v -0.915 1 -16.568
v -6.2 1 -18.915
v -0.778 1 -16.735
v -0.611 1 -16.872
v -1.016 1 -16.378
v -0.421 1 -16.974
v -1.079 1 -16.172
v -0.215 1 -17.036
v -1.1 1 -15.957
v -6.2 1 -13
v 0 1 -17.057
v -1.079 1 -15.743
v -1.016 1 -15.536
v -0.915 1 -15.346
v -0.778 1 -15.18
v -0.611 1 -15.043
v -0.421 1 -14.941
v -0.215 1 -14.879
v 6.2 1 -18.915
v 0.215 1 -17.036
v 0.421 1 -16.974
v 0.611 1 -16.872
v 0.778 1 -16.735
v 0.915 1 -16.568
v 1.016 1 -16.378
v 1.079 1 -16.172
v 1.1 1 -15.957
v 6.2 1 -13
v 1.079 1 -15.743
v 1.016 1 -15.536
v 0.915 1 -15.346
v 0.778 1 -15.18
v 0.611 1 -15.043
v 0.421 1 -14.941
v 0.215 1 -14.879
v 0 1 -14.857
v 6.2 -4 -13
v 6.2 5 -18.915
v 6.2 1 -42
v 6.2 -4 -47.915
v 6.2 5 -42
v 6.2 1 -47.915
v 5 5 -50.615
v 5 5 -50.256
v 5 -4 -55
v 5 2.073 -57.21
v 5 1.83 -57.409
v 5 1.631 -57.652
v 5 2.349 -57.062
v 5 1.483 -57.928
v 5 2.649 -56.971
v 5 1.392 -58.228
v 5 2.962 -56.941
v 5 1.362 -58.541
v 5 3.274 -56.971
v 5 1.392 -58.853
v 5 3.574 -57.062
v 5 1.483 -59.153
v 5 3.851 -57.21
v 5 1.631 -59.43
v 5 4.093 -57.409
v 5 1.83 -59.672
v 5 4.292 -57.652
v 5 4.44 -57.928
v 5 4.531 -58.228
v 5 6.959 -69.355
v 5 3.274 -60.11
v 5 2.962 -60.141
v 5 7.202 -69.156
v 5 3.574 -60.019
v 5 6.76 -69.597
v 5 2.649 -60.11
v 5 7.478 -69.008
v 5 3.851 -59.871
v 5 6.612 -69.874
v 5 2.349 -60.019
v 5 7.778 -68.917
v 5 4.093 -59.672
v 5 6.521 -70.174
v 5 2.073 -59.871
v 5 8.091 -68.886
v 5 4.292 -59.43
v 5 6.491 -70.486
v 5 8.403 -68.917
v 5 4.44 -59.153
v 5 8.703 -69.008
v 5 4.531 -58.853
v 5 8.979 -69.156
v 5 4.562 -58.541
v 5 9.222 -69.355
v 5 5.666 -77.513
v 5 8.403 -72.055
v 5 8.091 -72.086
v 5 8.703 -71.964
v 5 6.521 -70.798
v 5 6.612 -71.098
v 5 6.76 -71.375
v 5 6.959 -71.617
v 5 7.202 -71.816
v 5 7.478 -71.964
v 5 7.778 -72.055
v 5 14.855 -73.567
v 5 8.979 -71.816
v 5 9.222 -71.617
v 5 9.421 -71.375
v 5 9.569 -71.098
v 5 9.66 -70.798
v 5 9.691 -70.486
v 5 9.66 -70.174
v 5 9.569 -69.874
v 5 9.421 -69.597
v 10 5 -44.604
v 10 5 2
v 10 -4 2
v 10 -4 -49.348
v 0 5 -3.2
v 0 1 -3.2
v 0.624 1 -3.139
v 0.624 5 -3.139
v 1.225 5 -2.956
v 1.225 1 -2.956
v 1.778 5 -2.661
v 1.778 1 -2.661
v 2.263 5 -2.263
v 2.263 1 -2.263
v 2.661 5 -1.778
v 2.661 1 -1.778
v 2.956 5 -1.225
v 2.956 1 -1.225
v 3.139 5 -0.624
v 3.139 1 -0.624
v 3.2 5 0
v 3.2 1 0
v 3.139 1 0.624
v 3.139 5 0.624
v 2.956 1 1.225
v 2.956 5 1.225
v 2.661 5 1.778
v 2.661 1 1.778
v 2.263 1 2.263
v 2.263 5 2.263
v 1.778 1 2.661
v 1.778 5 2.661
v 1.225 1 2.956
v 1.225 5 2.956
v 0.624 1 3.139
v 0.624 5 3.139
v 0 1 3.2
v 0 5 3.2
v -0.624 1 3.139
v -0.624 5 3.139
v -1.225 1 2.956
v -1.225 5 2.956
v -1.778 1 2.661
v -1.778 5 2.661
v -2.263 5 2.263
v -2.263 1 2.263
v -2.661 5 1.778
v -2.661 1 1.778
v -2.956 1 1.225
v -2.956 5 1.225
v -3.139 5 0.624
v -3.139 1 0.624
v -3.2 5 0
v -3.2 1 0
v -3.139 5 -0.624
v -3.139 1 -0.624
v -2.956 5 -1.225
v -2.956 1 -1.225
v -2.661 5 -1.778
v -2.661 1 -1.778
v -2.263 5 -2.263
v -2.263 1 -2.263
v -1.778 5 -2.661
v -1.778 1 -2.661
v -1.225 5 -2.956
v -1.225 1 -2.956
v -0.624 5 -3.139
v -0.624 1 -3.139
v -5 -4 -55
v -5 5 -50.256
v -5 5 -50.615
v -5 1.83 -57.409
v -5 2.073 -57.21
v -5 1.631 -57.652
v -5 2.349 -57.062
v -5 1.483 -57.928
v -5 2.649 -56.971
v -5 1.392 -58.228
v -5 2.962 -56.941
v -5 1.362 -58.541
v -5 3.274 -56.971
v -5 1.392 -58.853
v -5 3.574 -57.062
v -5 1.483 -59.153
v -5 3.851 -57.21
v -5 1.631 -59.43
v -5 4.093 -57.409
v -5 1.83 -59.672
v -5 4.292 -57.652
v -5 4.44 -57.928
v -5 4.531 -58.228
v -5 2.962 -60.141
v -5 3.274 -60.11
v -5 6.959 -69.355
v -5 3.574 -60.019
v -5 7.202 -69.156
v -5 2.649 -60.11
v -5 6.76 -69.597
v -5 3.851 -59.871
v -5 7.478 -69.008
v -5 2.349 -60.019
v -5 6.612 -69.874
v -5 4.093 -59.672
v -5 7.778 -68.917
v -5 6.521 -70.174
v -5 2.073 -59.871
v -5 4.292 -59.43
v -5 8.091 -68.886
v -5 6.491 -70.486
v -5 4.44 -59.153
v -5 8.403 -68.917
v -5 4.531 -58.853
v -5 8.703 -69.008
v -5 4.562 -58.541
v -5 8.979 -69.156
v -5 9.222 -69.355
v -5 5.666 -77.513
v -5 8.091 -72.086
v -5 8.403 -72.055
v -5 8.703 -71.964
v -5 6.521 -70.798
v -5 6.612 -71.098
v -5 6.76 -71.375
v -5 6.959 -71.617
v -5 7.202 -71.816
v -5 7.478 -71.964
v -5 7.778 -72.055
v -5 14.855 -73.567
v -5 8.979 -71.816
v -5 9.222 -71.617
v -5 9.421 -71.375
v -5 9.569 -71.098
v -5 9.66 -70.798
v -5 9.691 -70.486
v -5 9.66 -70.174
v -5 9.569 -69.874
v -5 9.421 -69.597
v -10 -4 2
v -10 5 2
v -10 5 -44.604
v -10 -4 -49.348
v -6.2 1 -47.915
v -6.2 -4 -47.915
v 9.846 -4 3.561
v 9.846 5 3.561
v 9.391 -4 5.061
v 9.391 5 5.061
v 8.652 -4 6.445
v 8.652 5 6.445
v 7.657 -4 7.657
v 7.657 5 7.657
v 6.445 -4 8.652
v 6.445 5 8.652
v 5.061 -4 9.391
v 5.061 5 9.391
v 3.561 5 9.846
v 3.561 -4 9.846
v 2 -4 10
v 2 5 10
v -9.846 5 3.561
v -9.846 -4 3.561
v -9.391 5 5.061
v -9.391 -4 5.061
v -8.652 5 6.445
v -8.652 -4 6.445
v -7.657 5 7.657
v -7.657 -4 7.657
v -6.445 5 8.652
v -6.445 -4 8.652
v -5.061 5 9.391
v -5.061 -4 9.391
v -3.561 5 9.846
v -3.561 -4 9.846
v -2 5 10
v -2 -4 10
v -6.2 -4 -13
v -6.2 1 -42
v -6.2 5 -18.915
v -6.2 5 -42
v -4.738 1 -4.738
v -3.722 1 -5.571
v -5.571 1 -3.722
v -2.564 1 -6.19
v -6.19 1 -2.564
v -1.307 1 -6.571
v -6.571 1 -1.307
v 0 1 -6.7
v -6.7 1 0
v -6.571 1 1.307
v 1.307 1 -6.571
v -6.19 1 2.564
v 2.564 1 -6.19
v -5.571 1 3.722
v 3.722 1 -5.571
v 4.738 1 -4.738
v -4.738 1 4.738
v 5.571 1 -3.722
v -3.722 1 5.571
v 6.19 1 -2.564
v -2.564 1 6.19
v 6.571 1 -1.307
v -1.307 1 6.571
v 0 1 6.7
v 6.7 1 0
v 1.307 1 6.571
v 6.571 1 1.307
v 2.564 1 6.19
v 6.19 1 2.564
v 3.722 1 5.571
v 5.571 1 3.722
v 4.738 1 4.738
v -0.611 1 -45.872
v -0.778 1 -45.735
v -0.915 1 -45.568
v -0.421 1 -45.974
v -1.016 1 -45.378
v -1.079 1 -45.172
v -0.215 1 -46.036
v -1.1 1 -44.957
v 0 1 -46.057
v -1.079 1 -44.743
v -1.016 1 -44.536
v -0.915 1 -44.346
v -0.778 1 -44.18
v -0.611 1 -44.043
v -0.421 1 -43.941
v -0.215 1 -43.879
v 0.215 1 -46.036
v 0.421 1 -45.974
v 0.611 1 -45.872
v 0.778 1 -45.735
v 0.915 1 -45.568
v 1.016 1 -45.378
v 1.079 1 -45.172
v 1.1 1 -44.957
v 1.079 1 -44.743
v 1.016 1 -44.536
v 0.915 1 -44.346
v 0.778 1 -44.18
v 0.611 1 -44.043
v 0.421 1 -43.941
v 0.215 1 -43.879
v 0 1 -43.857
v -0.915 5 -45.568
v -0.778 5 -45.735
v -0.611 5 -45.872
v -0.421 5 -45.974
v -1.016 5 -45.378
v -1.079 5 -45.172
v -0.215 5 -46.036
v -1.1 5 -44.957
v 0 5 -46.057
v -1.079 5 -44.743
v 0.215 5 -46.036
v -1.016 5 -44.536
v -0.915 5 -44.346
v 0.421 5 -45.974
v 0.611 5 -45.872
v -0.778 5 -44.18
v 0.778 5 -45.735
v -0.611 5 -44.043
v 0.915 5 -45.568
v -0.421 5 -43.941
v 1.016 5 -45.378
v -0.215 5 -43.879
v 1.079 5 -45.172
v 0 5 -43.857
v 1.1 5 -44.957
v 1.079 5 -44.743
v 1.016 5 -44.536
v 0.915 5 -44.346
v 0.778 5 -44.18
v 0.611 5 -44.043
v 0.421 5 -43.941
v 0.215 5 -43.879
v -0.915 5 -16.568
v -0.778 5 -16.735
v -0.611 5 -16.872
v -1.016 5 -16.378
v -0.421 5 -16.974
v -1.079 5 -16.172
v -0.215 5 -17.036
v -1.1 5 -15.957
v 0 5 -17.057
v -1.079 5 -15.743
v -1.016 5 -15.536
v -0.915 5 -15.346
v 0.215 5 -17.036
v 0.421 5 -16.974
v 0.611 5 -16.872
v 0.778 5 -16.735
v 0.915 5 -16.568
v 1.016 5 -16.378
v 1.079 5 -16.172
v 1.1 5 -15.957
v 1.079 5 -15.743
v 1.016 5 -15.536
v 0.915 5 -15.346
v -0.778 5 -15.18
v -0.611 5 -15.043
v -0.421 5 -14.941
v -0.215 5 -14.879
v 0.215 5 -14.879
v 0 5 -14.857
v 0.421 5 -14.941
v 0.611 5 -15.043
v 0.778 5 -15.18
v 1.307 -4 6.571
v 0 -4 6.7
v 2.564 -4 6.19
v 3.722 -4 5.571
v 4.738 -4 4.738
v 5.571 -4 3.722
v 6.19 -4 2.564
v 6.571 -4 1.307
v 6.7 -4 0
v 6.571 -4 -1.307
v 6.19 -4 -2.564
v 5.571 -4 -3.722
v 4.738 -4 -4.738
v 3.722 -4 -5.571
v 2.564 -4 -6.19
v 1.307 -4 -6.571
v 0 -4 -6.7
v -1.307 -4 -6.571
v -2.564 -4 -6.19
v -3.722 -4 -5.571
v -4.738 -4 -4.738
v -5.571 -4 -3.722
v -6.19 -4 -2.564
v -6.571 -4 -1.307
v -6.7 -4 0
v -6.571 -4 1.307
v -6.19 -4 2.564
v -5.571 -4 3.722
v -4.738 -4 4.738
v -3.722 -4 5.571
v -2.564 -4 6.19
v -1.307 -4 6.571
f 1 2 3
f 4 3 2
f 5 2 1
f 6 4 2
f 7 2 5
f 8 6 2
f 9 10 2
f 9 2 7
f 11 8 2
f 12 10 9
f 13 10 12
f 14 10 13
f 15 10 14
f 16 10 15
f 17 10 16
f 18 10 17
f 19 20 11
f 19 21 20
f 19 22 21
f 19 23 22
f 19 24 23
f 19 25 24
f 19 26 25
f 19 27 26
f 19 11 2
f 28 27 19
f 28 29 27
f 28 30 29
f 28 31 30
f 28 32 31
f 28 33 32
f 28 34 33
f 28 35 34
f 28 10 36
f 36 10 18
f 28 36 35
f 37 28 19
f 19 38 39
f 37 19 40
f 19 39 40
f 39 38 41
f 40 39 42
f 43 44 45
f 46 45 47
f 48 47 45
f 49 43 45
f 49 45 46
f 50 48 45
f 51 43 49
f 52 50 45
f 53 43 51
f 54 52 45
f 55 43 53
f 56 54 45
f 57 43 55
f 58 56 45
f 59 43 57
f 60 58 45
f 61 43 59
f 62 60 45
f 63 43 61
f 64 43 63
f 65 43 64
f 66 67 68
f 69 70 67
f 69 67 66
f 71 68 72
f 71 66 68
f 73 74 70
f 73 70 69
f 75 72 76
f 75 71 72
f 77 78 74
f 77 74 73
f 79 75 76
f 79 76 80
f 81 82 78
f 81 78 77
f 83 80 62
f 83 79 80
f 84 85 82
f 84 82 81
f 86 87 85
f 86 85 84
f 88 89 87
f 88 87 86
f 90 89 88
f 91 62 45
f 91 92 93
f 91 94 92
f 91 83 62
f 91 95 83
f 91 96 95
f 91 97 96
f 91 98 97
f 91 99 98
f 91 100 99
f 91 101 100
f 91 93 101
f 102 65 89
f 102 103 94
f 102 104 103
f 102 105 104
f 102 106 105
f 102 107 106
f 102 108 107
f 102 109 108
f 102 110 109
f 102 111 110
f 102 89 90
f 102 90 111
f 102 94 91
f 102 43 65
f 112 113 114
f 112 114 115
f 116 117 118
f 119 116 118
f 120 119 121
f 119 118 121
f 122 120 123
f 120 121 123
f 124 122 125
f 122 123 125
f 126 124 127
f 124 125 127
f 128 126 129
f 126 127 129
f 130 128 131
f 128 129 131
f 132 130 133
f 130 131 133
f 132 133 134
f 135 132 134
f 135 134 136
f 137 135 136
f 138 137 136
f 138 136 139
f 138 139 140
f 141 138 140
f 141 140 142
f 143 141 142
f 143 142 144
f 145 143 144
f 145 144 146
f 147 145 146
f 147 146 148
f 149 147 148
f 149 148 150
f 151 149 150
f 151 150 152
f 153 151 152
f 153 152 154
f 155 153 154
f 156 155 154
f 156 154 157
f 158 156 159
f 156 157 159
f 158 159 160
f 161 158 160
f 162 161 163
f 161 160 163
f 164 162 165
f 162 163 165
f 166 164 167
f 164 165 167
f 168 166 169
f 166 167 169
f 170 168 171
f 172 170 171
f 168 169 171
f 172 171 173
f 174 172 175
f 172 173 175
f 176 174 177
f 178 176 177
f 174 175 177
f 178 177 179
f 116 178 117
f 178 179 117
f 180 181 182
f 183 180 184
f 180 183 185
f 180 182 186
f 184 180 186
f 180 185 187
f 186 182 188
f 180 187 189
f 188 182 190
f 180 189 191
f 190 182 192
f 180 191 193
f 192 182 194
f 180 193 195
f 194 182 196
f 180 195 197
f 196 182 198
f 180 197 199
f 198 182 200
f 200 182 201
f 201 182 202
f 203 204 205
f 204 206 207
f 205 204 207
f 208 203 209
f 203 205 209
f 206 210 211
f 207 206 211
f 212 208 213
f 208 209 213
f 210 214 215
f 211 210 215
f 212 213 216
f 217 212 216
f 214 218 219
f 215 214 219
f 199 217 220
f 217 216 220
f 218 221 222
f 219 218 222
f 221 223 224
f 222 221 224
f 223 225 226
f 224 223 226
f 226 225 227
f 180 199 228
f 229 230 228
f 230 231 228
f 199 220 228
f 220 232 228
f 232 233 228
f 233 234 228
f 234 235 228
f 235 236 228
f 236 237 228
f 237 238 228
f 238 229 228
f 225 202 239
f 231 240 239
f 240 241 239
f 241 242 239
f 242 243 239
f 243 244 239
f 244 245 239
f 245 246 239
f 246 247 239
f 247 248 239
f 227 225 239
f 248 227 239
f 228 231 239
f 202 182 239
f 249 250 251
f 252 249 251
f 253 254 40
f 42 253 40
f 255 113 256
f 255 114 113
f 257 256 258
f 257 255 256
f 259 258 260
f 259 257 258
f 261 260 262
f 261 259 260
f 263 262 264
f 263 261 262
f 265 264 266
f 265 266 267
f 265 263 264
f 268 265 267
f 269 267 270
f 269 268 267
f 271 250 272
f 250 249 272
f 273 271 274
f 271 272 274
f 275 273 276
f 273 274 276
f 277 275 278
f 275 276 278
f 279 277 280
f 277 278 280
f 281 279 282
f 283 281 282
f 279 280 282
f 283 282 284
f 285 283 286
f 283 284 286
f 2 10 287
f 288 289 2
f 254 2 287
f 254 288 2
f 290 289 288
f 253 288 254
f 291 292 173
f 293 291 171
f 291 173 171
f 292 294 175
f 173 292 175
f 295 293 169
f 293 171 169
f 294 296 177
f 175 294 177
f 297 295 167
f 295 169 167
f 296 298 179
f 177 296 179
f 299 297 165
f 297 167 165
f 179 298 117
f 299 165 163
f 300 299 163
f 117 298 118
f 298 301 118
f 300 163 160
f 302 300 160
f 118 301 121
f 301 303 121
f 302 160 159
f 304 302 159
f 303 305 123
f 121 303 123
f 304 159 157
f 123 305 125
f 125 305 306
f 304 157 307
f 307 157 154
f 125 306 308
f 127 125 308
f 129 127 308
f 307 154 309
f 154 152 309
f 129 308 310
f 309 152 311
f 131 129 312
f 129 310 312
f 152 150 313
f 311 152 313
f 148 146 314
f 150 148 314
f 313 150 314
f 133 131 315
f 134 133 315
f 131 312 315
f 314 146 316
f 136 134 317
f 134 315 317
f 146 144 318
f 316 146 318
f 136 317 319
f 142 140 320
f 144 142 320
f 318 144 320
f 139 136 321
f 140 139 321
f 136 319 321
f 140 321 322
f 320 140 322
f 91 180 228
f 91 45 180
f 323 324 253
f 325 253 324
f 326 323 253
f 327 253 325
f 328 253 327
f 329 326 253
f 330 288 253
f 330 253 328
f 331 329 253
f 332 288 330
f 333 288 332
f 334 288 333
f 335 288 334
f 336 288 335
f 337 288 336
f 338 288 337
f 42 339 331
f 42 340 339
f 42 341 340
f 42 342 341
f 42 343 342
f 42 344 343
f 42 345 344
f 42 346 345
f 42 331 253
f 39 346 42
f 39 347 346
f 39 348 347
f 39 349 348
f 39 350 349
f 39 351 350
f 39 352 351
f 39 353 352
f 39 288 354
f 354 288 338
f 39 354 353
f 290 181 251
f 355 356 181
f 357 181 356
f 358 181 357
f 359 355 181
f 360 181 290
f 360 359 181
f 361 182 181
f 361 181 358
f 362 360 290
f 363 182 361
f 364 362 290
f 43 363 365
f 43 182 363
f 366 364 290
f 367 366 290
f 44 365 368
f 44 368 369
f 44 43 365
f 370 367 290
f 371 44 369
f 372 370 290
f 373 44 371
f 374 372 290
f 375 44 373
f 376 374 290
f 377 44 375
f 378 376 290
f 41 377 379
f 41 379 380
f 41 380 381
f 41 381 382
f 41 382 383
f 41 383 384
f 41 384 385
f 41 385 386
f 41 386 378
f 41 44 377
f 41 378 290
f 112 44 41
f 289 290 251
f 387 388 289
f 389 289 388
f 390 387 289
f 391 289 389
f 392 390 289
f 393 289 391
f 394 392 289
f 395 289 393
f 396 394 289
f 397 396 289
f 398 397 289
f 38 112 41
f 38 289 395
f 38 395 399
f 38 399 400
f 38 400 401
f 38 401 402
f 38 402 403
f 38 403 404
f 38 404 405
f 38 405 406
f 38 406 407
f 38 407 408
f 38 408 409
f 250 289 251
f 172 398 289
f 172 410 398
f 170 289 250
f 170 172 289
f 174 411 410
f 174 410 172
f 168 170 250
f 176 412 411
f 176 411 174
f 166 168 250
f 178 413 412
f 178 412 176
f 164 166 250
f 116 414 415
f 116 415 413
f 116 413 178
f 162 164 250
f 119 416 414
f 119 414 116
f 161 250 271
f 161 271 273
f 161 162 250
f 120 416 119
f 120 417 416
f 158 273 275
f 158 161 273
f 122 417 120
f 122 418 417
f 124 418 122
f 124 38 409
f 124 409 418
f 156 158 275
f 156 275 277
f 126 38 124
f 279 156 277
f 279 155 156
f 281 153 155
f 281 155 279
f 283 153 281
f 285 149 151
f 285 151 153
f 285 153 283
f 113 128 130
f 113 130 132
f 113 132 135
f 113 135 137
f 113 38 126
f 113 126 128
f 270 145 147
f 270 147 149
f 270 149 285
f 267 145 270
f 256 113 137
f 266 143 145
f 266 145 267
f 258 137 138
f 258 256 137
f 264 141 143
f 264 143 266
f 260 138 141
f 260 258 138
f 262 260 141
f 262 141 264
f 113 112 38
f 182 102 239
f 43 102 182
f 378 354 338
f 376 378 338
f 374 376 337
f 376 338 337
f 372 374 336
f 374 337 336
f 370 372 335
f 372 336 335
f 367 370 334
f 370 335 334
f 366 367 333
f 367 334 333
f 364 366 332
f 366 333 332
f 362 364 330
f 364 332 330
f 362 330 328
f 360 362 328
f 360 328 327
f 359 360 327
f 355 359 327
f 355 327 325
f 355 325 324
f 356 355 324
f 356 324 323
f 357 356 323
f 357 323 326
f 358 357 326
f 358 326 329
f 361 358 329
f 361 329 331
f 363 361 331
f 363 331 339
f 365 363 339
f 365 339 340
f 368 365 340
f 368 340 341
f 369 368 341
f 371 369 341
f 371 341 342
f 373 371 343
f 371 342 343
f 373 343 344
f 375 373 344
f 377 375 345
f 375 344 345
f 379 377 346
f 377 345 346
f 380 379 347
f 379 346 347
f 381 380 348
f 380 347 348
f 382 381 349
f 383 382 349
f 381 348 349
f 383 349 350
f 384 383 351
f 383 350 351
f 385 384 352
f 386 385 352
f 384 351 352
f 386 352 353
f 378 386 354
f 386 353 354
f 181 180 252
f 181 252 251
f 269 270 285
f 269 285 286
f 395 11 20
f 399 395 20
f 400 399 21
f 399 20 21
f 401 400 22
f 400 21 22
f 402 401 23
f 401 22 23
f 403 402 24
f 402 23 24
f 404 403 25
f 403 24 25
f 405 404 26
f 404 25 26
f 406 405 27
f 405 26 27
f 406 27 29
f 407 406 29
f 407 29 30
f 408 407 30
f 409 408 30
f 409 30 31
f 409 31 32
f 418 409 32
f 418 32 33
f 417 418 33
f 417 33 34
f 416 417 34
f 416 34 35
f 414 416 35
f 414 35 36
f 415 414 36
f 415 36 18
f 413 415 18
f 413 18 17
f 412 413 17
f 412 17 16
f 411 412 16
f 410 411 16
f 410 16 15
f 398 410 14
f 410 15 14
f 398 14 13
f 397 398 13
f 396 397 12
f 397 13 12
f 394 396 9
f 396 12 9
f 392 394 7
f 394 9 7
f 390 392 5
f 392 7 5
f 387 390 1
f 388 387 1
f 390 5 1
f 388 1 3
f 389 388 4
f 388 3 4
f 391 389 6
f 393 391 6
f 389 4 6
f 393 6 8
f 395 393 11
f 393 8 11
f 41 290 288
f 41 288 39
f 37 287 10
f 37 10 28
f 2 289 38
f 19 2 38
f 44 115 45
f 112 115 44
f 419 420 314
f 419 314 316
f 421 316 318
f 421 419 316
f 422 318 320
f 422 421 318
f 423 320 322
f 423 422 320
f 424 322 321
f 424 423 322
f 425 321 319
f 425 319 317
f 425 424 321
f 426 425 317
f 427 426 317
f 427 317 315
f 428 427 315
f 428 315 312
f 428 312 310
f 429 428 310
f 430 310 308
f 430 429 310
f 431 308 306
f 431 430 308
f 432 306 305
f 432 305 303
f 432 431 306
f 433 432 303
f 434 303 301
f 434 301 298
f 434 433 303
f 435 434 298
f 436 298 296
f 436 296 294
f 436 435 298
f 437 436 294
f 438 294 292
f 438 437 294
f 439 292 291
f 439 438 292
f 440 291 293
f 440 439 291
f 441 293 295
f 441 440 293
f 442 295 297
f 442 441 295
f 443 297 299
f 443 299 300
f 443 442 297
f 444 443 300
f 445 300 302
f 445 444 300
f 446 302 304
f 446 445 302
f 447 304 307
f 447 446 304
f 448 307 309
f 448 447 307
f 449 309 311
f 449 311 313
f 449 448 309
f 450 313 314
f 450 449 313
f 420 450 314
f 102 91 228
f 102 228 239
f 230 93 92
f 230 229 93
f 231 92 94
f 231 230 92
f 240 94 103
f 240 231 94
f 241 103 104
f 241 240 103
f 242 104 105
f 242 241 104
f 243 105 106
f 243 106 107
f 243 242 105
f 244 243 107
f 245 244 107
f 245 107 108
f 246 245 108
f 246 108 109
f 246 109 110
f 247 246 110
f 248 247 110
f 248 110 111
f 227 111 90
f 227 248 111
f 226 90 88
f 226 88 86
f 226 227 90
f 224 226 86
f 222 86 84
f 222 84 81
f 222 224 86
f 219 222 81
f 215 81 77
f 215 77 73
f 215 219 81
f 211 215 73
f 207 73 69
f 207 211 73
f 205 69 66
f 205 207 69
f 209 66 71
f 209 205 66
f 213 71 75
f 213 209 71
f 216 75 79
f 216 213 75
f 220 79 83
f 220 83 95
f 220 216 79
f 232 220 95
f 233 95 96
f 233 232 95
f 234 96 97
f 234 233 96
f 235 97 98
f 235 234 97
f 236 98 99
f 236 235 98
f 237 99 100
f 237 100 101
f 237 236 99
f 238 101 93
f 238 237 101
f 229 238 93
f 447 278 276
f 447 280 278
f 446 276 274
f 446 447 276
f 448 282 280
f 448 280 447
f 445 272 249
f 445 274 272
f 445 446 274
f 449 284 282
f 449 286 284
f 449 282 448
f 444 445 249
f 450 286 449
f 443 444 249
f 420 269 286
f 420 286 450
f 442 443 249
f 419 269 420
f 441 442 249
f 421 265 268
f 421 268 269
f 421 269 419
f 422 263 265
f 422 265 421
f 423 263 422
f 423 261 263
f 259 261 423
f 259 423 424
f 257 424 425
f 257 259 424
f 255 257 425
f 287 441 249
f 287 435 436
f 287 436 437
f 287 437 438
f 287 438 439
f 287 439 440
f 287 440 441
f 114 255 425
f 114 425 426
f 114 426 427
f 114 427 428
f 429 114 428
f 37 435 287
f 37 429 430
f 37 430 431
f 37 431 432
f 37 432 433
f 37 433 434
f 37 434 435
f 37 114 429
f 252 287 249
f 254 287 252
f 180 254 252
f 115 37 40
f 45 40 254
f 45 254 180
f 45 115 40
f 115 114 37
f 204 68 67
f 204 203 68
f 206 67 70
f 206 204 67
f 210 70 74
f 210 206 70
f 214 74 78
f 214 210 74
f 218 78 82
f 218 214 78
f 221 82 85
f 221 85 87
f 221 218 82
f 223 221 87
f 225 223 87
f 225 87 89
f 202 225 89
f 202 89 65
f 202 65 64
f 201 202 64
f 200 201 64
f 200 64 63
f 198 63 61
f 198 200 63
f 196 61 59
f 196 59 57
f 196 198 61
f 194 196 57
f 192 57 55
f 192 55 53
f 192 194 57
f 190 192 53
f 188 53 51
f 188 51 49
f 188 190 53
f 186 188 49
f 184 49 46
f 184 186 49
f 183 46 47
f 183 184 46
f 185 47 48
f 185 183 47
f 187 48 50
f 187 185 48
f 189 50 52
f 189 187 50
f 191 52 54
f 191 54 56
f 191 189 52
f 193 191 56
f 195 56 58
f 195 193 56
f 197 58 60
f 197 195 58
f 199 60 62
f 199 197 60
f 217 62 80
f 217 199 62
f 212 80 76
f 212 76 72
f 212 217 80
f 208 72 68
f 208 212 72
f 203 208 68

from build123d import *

# Parameters (mm, degrees)
EXTRUDE_1_DEPTH     = 10
SKETCH_2_R          = 6.7
CUT_EXTRUDE_1_DEPTH = 5
SKETCH_4_R          = 3.2
CUT_EXTRUDE_3_DEPTH = 57.124860802
SKETCH_3_W          = 12.4
SKETCH_3_H          = 23.085257288
CUT_EXTRUDE_2_DEPTH = 57.621550668
SKETCH_5_W          = 12.4
SKETCH_5_H          = 34.914742712
CUT_EXTRUDE_4_DEPTH = 5
SKETCH_6_R          = 1.1
CUT_EXTRUDE_5_DEPTH = 57.124860802
FILLET_1_R          = 8
SKETCH_9_R          = 1.6
EXTRUDE_2_DEPTH     = 5
CHAMFER_2_SIZE      = 5


with BuildPart() as part:
    # 草图1 → 凸台-拉伸1 (new, symmetric)
    with BuildSketch(Plane(origin=(0, 0, 0), x_dir=(0, 0, -1), z_dir=(1, 0, 0))):
        Polygon((55, -4), (50.256311045, 5), (-10, 5), (-10, -4), align=None)
    extrude(amount=EXTRUDE_1_DEPTH, both=True)

    # 草图2 → 切除-拉伸1 (cut)
    with BuildSketch(Plane(origin=(0, -4, 0), x_dir=(1, 0, 0), z_dir=(0, 1, 0))):
        with Locations(Location((0, 0, 0), (0, 0, 270))):
            Circle(SKETCH_2_R)
    extrude(amount=CUT_EXTRUDE_1_DEPTH, mode=Mode.SUBTRACT)

    # 草图4 → 切除-拉伸3 (cut, through all)
    with BuildSketch(Plane.XZ.offset(-1)):
        with Locations(Location((0, 0, 0), (0, 0, 270))):
            Circle(SKETCH_4_R)
    extrude(amount=-CUT_EXTRUDE_3_DEPTH, mode=Mode.SUBTRACT)

    # 草图3 → 切除-拉伸2 (cut, through all)
    with BuildSketch(Plane(origin=(0, 5, 0), x_dir=(1, 0, 0), z_dir=(0, 1, 0))):
        with Locations((0, 30.457371356)):
            Rectangle(SKETCH_3_W, SKETCH_3_H)
    extrude(amount=-CUT_EXTRUDE_2_DEPTH, mode=Mode.SUBTRACT)

    # 草图5 → 切除-拉伸4 (cut)
    with BuildSketch(Plane.XZ.offset(4)):
        with Locations((0, -30.457371356)):
            Rectangle(SKETCH_5_W, SKETCH_5_H)
    extrude(amount=-CUT_EXTRUDE_4_DEPTH, mode=Mode.SUBTRACT)

    # 草图6 → 切除-拉伸5 (cut, through all)
    with BuildSketch(Plane.XZ.offset(-1)):
        with Locations(Location((0, -15.957371356, 0), (0, 0, 270))):
            Circle(SKETCH_6_R)
        with Locations(Location((0, -44.957371356, 0), (0, 0, 90))):
            Circle(SKETCH_6_R)
    extrude(amount=-CUT_EXTRUDE_5_DEPTH, mode=Mode.SUBTRACT)

    # 圆角1
    fillet_1_edges = [part.edges().sort_by_distance(p)[0] for p in [
        (10, 0.5, 10),
        (-10, 0.5, 10),
    ]]
    fillet(fillet_1_edges, radius=FILLET_1_R)

    # 草图9 → 凸台-拉伸2 (add, symmetric)
    with BuildSketch(Plane(origin=(0, 0, 0), x_dir=(0, 0, -1), z_dir=(1, 0, 0))):
        Polygon((55, -4), (77.512583876, 5.666104035), (73.567235291, 14.85491378), (50.614909072, 5), (50.256311045, 5), align=None)
        with Locations((70.486064224, 8.090567185)):
            Circle(SKETCH_9_R, mode=Mode.SUBTRACT)
        with Locations((58.540611554, 2.961614024)):
            Circle(SKETCH_9_R, mode=Mode.SUBTRACT)
    extrude(amount=EXTRUDE_2_DEPTH, both=True)

    # 倒角2
    chamfer_2_edges = [part.edges().sort_by_distance(p)[0] for p in [
        (-10, 0.5, -52.628155522),
        (10, 0.5, -52.628155522),
    ]]
    chamfer(chamfer_2_edges, length=CHAMFER_2_SIZE - 0.0001)  # a hair under: the kernel refuses the full size


solid = part.part
